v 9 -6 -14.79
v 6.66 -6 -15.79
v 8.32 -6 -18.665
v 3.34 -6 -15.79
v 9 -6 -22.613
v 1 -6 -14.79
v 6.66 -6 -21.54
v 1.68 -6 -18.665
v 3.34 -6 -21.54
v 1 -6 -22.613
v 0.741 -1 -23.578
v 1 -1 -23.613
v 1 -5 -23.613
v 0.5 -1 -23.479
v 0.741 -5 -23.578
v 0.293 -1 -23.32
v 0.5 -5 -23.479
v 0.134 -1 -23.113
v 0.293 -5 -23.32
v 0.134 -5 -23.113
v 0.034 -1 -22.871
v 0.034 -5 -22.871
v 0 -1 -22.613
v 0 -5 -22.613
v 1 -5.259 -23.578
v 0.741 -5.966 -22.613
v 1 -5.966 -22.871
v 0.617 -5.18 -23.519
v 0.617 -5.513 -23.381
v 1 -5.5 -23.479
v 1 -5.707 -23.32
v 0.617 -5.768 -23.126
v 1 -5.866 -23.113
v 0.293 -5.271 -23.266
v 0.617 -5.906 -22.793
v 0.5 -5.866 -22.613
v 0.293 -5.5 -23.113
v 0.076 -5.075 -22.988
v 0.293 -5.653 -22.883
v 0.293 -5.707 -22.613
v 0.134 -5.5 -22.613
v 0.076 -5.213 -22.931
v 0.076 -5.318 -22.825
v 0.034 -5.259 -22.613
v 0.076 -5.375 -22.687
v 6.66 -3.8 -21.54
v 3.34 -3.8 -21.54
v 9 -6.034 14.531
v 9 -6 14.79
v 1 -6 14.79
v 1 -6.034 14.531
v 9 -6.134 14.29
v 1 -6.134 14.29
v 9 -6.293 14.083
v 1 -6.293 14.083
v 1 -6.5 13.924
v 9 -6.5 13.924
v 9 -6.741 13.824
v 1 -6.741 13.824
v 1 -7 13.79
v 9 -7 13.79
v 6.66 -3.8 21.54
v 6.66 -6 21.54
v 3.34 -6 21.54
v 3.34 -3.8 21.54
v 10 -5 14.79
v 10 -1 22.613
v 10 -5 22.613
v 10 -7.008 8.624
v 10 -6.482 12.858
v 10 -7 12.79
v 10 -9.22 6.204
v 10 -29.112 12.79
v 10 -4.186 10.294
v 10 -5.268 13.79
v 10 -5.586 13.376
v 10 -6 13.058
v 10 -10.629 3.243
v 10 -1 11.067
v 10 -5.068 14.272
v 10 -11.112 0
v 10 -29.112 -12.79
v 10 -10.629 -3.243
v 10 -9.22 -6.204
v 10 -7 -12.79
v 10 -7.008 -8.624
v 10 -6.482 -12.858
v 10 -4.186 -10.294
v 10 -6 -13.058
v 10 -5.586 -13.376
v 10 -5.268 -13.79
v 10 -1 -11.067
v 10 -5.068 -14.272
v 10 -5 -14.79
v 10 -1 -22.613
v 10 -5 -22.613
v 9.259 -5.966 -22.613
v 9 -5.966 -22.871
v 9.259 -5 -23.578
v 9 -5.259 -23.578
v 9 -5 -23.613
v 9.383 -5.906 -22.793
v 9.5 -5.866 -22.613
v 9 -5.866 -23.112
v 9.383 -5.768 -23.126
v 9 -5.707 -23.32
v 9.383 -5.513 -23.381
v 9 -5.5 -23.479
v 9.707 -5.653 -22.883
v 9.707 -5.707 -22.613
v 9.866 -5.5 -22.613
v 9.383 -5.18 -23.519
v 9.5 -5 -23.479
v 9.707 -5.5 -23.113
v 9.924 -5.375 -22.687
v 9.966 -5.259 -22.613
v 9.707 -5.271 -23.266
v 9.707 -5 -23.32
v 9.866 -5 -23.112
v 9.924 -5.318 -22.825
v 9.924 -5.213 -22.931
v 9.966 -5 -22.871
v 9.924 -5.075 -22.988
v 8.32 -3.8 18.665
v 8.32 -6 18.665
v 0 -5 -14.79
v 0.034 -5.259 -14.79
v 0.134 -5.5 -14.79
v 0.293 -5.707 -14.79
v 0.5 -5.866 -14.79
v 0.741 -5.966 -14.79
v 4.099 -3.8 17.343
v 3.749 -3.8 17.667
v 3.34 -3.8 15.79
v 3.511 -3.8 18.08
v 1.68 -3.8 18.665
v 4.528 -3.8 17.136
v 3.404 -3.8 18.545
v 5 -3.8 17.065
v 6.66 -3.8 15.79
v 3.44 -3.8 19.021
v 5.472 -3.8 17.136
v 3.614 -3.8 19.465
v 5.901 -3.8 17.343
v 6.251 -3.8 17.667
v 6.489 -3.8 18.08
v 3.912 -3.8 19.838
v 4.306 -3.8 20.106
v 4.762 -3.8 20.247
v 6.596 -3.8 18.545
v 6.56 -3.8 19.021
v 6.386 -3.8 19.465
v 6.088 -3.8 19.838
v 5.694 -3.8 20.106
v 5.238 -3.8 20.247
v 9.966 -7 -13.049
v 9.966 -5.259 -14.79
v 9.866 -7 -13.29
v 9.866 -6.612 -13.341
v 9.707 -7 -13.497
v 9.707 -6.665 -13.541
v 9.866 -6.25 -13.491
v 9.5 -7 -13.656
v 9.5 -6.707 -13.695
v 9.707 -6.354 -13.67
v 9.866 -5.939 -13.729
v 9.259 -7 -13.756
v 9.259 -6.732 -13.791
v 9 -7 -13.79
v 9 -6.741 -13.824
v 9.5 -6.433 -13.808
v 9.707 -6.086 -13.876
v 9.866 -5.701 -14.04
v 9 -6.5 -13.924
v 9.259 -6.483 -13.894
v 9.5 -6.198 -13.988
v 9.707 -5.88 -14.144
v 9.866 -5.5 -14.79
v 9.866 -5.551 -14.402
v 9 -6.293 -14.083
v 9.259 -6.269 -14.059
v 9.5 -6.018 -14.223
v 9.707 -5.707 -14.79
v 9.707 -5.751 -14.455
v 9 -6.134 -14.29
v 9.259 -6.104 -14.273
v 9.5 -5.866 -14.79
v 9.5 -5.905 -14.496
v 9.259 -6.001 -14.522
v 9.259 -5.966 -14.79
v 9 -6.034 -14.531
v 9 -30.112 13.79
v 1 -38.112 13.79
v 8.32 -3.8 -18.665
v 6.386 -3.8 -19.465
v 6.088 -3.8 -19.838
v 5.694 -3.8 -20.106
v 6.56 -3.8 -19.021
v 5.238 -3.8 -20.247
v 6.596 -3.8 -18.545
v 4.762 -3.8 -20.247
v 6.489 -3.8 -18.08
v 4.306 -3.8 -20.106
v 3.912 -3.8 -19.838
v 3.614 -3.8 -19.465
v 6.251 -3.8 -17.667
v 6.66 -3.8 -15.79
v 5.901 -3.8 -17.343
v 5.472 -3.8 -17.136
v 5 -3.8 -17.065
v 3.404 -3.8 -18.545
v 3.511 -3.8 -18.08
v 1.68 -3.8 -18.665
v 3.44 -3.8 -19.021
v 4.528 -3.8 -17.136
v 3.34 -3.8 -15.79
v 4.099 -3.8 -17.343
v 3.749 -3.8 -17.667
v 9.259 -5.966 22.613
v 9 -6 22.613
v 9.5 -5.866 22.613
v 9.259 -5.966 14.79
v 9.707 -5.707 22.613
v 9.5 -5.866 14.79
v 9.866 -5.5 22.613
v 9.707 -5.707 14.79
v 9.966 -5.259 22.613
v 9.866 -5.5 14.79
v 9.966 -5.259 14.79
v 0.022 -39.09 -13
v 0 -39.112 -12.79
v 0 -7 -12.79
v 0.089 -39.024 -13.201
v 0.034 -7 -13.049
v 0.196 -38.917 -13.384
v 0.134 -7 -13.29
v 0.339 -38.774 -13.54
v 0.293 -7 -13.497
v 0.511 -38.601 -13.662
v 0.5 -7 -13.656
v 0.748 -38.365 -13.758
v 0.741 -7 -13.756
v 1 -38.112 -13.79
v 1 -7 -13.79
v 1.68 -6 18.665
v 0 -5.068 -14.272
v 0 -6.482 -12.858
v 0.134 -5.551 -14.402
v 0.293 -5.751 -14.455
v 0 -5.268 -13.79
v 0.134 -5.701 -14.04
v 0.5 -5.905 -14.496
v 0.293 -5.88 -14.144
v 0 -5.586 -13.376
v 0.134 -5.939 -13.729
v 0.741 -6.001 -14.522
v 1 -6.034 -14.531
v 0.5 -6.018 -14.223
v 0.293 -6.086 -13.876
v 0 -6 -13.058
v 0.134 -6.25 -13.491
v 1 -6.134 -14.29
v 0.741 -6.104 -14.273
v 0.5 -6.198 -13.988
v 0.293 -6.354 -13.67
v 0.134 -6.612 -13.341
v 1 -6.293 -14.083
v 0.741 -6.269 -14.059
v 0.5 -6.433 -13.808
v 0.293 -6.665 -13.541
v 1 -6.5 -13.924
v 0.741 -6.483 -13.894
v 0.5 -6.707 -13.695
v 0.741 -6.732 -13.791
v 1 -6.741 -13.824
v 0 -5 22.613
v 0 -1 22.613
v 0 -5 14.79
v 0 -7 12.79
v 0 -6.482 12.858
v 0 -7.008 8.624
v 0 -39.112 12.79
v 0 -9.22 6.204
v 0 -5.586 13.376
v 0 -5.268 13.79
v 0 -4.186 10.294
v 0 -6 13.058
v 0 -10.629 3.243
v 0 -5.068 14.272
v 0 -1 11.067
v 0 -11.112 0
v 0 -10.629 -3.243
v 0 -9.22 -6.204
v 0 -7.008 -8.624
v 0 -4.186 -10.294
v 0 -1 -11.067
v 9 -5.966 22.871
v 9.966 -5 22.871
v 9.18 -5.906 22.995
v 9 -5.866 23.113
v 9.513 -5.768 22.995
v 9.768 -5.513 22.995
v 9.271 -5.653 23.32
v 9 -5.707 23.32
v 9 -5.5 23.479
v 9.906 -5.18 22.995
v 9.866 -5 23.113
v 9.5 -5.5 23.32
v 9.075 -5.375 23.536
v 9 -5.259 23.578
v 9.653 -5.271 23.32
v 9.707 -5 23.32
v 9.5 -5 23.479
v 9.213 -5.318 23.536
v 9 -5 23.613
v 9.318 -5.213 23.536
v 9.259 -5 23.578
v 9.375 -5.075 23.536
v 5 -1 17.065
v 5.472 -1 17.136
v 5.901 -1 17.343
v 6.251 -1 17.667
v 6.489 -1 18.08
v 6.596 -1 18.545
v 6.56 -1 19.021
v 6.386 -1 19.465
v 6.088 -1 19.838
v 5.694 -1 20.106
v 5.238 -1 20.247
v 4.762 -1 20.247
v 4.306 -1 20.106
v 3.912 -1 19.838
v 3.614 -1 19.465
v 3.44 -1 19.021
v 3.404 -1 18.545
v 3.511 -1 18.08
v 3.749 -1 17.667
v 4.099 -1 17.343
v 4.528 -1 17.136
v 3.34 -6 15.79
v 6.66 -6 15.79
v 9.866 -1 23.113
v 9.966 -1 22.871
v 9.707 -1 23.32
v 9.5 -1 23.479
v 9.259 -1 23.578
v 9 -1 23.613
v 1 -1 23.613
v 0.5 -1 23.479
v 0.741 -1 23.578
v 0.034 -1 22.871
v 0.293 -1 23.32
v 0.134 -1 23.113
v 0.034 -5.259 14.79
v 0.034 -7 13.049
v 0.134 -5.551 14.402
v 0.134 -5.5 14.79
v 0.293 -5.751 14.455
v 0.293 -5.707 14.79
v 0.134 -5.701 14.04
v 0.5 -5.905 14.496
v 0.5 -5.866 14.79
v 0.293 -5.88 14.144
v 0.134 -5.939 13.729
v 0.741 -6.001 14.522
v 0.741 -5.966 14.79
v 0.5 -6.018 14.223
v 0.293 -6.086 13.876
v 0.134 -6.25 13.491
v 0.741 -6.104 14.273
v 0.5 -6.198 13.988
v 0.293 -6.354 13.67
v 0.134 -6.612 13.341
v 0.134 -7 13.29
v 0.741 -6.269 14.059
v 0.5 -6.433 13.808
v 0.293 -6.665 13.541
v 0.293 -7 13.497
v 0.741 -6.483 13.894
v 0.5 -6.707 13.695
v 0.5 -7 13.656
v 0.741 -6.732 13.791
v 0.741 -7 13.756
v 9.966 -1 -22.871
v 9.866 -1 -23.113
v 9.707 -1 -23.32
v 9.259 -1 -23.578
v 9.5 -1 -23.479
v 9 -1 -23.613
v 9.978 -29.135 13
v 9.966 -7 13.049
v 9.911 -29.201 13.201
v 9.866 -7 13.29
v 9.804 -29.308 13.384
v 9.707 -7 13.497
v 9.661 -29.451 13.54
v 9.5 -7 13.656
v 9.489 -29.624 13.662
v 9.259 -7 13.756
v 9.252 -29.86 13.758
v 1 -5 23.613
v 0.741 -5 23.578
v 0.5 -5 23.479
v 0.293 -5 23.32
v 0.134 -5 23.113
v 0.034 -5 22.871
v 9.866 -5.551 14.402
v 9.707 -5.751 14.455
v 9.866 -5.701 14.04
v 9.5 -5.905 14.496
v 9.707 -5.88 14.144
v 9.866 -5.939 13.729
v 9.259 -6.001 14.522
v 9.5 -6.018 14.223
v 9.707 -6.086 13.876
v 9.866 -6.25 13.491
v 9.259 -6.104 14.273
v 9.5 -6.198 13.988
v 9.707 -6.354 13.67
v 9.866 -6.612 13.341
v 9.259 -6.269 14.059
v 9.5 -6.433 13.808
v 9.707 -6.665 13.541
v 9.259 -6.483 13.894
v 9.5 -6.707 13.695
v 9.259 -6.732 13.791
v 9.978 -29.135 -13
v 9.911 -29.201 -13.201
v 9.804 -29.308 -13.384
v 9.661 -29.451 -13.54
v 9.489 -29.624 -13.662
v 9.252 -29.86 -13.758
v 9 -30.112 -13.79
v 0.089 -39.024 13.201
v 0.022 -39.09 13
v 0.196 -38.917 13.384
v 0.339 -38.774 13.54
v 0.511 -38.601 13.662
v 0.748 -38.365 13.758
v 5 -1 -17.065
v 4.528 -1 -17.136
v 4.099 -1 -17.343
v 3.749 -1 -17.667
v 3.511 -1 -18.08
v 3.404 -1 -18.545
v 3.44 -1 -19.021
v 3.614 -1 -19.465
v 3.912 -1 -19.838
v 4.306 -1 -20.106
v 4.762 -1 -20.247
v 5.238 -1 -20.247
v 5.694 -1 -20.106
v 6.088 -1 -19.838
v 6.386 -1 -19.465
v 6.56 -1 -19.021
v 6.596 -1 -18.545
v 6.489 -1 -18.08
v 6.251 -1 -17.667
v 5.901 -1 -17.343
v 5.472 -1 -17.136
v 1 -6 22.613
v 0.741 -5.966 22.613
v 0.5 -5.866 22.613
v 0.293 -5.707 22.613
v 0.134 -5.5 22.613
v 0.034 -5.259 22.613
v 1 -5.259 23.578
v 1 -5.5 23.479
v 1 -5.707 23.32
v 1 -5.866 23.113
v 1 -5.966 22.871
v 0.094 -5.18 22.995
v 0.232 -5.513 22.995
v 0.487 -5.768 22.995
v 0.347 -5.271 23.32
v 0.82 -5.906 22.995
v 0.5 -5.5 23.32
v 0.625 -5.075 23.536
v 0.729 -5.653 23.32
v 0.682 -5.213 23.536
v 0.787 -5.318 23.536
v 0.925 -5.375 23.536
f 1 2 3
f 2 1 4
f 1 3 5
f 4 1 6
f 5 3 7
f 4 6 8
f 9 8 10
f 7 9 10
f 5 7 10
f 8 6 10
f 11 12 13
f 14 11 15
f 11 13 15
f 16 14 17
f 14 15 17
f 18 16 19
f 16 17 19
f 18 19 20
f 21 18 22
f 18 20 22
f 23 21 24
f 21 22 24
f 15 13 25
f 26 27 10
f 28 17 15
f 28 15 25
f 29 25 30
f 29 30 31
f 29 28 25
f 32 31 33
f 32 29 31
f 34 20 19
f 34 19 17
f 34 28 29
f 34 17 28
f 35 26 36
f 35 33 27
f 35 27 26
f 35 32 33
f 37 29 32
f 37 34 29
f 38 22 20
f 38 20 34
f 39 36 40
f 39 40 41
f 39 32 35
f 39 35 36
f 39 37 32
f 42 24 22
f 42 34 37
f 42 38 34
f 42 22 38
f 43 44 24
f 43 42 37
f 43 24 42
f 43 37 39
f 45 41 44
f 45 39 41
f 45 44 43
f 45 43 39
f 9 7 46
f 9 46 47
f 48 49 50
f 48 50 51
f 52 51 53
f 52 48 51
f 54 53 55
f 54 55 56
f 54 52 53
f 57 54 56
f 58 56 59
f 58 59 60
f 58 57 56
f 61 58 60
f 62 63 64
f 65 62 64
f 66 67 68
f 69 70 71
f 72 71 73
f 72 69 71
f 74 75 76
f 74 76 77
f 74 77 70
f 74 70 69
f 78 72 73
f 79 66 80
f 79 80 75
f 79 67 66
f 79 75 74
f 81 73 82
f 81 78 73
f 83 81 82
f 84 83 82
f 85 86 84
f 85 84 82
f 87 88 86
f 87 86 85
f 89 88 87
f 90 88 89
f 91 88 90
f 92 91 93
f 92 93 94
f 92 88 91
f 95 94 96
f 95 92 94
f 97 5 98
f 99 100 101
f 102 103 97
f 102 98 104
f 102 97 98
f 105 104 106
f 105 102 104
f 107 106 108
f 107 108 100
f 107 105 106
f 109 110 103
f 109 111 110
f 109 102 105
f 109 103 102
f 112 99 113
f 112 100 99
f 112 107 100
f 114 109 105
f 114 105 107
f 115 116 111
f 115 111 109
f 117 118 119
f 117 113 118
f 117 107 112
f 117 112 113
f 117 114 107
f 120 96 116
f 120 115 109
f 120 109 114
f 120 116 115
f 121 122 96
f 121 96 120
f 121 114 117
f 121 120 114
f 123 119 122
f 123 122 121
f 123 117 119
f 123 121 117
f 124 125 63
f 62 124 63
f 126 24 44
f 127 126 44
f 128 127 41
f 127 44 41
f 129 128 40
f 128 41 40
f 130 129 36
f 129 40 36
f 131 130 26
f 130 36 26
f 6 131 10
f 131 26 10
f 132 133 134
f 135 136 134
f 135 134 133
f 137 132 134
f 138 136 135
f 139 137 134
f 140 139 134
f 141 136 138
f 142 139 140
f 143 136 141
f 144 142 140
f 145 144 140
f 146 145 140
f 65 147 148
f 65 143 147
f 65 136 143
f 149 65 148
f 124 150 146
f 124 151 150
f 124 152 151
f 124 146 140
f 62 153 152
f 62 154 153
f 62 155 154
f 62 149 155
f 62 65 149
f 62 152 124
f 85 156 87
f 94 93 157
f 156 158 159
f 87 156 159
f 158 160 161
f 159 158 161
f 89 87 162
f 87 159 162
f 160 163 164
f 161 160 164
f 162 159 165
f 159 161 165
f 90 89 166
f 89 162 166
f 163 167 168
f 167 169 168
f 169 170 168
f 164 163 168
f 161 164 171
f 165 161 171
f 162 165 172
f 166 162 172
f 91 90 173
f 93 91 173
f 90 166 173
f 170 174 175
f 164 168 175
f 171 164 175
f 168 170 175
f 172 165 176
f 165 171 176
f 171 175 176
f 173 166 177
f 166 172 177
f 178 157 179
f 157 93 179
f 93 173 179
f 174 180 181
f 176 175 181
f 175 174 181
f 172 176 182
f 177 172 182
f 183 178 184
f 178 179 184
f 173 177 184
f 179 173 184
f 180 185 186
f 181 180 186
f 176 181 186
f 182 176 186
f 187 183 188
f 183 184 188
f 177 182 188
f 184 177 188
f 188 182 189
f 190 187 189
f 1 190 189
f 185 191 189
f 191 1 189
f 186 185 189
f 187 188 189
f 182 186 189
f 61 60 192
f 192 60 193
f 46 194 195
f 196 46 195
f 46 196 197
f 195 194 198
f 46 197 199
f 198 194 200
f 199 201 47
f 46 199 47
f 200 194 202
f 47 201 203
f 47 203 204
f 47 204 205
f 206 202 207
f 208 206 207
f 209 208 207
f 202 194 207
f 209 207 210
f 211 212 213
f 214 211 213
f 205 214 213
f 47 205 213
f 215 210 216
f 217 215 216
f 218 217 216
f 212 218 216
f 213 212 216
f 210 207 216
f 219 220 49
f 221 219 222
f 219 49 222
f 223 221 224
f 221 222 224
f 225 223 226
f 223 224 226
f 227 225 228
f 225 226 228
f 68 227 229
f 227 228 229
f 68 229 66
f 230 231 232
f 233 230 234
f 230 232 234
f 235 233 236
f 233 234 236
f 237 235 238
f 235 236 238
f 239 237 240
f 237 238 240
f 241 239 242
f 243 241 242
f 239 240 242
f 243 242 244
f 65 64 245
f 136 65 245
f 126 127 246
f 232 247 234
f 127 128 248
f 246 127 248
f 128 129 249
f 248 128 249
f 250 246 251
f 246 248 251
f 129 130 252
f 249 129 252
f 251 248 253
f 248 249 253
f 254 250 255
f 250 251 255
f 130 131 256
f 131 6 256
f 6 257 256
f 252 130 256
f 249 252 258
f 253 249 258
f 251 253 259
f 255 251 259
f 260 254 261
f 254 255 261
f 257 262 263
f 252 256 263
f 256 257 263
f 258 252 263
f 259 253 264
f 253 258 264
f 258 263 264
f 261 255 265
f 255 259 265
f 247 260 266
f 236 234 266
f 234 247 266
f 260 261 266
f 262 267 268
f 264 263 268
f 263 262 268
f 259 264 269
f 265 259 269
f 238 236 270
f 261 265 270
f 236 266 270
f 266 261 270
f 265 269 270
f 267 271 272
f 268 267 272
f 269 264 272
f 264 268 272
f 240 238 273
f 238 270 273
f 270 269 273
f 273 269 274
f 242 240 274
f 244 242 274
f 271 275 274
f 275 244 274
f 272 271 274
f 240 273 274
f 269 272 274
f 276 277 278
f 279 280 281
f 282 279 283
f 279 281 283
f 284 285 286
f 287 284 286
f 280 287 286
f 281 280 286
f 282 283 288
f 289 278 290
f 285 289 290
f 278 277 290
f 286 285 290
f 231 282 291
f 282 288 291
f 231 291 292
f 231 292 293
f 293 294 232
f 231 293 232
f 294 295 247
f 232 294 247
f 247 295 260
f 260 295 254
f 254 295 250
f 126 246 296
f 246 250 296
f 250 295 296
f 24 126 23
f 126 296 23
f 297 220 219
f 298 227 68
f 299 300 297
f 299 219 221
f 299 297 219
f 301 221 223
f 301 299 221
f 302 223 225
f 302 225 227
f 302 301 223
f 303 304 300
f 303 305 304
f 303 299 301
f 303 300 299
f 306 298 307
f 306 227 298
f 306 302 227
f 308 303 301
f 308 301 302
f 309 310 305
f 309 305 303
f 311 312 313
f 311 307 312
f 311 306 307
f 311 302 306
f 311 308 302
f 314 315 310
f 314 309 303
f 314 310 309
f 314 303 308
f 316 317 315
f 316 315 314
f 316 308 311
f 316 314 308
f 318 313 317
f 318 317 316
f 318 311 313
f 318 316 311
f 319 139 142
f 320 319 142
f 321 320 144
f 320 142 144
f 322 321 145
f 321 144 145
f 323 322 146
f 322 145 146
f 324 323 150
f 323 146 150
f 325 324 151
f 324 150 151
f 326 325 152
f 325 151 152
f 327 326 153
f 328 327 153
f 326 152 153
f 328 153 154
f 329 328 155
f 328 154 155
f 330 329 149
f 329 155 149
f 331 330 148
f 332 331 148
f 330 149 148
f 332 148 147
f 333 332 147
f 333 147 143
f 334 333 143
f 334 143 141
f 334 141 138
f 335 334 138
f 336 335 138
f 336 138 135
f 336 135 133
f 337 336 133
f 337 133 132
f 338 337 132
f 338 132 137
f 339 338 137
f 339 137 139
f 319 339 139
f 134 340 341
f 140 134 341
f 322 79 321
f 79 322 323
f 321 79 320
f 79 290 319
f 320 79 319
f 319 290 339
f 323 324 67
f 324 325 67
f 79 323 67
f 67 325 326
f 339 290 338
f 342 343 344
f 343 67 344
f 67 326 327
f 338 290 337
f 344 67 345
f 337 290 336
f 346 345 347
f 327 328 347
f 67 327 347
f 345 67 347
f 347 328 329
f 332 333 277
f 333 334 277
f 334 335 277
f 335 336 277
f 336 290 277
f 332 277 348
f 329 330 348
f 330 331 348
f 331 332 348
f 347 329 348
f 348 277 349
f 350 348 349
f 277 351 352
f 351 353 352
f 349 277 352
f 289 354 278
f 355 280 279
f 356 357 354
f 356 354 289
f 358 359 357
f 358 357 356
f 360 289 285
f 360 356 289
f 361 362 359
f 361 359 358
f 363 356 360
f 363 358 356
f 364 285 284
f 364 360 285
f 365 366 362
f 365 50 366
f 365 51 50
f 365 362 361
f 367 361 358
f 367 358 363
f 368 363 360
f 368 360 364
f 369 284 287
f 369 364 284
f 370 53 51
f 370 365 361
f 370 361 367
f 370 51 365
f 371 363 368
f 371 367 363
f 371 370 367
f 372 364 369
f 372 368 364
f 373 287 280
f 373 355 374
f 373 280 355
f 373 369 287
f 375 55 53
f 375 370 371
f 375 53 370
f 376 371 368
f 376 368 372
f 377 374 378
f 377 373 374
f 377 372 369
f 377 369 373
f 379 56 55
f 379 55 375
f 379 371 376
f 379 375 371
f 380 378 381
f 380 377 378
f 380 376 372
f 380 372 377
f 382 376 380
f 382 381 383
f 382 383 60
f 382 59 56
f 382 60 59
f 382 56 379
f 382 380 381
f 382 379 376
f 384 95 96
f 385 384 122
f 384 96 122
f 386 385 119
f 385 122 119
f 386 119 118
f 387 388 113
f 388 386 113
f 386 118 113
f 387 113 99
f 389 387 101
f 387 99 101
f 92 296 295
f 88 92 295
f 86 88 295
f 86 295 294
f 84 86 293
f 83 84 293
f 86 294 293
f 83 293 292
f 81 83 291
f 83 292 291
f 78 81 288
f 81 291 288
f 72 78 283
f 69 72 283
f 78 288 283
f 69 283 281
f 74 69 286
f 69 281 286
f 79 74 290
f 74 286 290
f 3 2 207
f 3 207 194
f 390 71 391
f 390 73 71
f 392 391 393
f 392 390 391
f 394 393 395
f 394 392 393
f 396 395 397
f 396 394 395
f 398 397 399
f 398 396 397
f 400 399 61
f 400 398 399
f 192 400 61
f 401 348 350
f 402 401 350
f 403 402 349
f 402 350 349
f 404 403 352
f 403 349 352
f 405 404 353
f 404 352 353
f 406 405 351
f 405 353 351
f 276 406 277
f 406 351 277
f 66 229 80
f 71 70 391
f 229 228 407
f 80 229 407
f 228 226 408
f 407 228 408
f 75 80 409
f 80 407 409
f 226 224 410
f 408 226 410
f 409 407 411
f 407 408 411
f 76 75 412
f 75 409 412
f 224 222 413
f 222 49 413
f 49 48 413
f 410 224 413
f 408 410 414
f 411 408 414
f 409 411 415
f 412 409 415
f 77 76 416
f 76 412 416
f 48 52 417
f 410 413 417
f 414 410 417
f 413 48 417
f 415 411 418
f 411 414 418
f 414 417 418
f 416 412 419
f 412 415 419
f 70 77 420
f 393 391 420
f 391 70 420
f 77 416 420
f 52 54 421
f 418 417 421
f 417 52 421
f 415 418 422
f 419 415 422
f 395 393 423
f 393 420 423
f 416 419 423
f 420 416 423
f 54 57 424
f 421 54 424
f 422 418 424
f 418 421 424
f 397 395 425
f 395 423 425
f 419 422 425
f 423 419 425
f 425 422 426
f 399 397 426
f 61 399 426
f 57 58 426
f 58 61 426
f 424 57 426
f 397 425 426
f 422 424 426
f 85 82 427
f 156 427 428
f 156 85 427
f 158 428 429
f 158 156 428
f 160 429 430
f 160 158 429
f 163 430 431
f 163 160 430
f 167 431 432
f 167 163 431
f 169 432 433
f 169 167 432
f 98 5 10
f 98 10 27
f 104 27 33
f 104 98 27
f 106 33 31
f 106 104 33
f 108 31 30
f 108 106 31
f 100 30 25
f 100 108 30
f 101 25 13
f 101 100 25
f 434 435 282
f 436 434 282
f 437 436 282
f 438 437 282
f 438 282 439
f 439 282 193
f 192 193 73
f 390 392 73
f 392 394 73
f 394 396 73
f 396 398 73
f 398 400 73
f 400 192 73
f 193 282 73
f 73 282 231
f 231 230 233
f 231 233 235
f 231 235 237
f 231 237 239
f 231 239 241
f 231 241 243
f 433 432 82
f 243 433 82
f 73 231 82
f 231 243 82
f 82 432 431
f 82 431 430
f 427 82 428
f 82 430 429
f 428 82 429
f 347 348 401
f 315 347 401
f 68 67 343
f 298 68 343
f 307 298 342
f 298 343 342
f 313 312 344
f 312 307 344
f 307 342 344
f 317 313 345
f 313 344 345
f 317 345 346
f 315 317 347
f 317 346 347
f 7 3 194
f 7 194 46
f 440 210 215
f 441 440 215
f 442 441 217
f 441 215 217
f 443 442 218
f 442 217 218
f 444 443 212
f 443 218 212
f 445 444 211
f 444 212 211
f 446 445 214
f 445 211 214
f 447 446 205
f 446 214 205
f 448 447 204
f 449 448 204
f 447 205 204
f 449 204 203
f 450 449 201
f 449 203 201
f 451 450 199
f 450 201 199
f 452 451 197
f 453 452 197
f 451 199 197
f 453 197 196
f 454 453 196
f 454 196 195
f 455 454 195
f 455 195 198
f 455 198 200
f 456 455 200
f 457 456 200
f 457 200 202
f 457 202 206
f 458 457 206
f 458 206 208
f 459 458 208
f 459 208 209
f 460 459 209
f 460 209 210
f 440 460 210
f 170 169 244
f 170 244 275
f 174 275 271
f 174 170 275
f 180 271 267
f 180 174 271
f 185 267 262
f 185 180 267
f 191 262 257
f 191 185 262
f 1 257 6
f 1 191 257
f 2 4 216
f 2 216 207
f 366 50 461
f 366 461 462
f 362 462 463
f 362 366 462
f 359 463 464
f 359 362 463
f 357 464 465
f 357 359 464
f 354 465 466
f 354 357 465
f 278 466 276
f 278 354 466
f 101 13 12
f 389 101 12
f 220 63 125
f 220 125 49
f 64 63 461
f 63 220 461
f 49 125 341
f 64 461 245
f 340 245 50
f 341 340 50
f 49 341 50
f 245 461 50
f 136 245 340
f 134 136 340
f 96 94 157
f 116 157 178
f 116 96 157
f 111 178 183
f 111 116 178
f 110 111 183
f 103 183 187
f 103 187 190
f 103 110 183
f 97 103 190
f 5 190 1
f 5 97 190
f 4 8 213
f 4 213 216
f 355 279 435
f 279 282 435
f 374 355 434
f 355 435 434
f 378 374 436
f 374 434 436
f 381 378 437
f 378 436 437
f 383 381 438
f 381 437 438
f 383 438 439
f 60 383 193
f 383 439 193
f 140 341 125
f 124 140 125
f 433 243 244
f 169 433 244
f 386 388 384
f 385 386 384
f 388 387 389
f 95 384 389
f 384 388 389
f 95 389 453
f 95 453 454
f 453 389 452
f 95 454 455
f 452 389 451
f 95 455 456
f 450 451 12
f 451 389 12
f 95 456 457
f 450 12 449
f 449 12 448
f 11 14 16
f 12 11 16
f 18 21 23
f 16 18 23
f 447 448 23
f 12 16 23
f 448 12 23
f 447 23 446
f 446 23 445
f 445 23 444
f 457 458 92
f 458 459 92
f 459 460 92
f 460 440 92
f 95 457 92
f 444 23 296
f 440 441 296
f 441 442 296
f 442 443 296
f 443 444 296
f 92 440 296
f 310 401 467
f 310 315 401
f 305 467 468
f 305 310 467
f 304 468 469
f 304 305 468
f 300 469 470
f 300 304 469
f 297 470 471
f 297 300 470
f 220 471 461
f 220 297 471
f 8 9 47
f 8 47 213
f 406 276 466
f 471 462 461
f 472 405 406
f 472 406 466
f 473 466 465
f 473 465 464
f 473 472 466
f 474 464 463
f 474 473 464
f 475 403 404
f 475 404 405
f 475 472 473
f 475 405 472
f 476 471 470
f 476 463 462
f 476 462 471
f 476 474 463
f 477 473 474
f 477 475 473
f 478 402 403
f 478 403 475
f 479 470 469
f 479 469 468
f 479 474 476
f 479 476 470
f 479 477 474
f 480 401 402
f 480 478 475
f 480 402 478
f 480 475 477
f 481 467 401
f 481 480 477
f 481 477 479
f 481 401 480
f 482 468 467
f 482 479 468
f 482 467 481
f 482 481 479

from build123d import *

# Parameters (mm, degrees)
CLAMP_EXTRUDE_DEPTH = 10
CUT_EXTRUDE3_DEPTH  = 56.03390543
FILLET2_R           = 1
FILLET3_R           = 1
CUT_EXTRUDE4_DEPTH  = 2.2
HOLE_5_R            = 1.6
CUT_EXTRUDE5_DEPTH  = 42.880637682


with BuildPart() as part:
    # Sketch4 → Clamp Extrude (new body)
    with BuildSketch(Plane(origin=(0, 0, 0), x_dir=(0, 0, -1), z_dir=(1, 0, 0))):
        with BuildLine():
            Line((-23.612500003, -1), (-23.612500003, -6))
            Line((-23.612500003, -6), (-13.789947652, -6))
            Line((-13.789947652, -6), (-13.789947652, -39.1125))
            Line((-13.789947652, -39.1125), (13.789947652, -39.1125))
            Line((13.789947652, -39.1125), (13.789947652, -6))
            Line((13.789947652, -6), (23.612500003, -6))
            Line((23.612500003, -6), (23.612500003, -1))
            Line((23.612500003, -1), (11.067414163, -1))
            ThreePointArc((11.067414163, -1), (0, -11.1125), (-11.067414163, -1))
            Line((-11.067414163, -1), (-23.612500003, -1))
        make_face()
    extrude(amount=CLAMP_EXTRUDE_DEPTH)

    # Sketch10 → Cut-Extrude3 (cut, through all)
    with BuildSketch(Plane(origin=(0, 0, -13.789947652), x_dir=(-1, 0, 0), z_dir=(0, 0, -1))):
        Polygon((0, -39.1125), (-10, -29.1125), (-10, -39.1125), align=None)
    extrude(amount=-CUT_EXTRUDE3_DEPTH, mode=Mode.SUBTRACT)

    # Fillet2
    fillet2_edges = [part.edges().sort_by_distance(p)[0] for p in [
        (0, -6, 18.701223827),
        (0, -6, -18.701223827),
        (0, -22.55625, -13.789947652),
        (0, -22.55625, 13.789947652),
        (10, -6, -18.701223827),
        (5, -6, 13.789947652),
        (5, -6, 23.612500003),
        (5, -6, -23.612500003),
        (5, -6, -13.789947652),
        (10, -17.55625, -13.789947652),
        (10, -6, 18.701223827),
        (10, -17.55625, 13.789947652),
    ]]
    fillet(fillet2_edges, radius=FILLET2_R)

    # Fillet3
    # the kernel refuses this fillet: 1 mm, written as the material it takes off along each edge
    with BuildSketch(Plane(origin=(1, -5, 22.612500003), x_dir=(-1, 0, 0), z_dir=(0, 0, 1))) as fillet3_piece_1_section:
        Polygon((0, 0), (FILLET3_R, 0), (FILLET3_R, FILLET3_R), (0, FILLET3_R), align=None)
    fillet3_piece_1 = extrude(amount=FILLET3_R, mode=Mode.PRIVATE)
    fillet3_piece_1 = fillet3_piece_1 - Plane(origin=(1, -5, 22.612500003), x_dir=(0.7071067811865475, 0.7071067811865475, 0), z_dir=(0, 0, 1)) * Sphere(FILLET3_R, mode=Mode.PRIVATE)
    add(fillet3_piece_1, mode=Mode.SUBTRACT)
    with BuildSketch(Plane(origin=(9, -5, 22.612500003), x_dir=(1, 0, 0), z_dir=(0, 0, 1))) as fillet3_piece_2_section:
        Polygon((0, 0), (FILLET3_R, 0), (FILLET3_R, -FILLET3_R), (0, -FILLET3_R), align=None)
    fillet3_piece_2 = extrude(amount=FILLET3_R, mode=Mode.PRIVATE)
    fillet3_piece_2 = fillet3_piece_2 - Plane(origin=(9, -5, 22.612500003), x_dir=(-0.7071067811865475, 0.7071067811865475, 0), z_dir=(0, 0, 1)) * Sphere(FILLET3_R, mode=Mode.PRIVATE)
    add(fillet3_piece_2, mode=Mode.SUBTRACT)
    with BuildSketch(Plane(origin=(9, -5, -22.612500003), x_dir=(0, 0, -1), z_dir=(1, 0, 0))) as fillet3_piece_3_section:
        Polygon((0, 0), (FILLET3_R, 0), (FILLET3_R, -FILLET3_R), (0, -FILLET3_R), align=None)
    fillet3_piece_3 = extrude(amount=FILLET3_R, mode=Mode.PRIVATE)
    fillet3_piece_3 = fillet3_piece_3 - Plane(origin=(9, -5, -22.612500003), x_dir=(0, 0.7071067811865475, 0.7071067811865475), z_dir=(1, 0, 0)) * Sphere(FILLET3_R, mode=Mode.PRIVATE)
    add(fillet3_piece_3, mode=Mode.SUBTRACT)
    with BuildSketch(Plane(origin=(1, -5, -22.612500003), x_dir=(0, 0, -1), z_dir=(-1, 0, 0))) as fillet3_piece_4_section:
        Polygon((0, 0), (FILLET3_R, 0), (FILLET3_R, FILLET3_R), (0, FILLET3_R), align=None)
    fillet3_piece_4 = extrude(amount=FILLET3_R, mode=Mode.PRIVATE)
    fillet3_piece_4 = fillet3_piece_4 - Plane(origin=(1, -5, -22.612500003), x_dir=(0, 0.7071067811865475, 0.7071067811865475), z_dir=(-1, 0, 0)) * Sphere(FILLET3_R, mode=Mode.PRIVATE)
    add(fillet3_piece_4, mode=Mode.SUBTRACT)
    with BuildSketch(Plane(origin=(0, 1.5, 23.612500003), x_dir=(1, 0, 0), z_dir=(0, -1, 0)), Plane(origin=(10, -5, -23.612500003), x_dir=(0, 0, 1), z_dir=(0, 1, 0))) as fillet3_piece_5:
        with BuildLine():
            CenterArc((FILLET3_R, -FILLET3_R), FILLET3_R, 90, 90)
            Line((0, -FILLET3_R), (0, 0))
            Line((0, 0), (FILLET3_R, 0))
        make_face()
    extrude(amount=6.5, mode=Mode.SUBTRACT)
    with BuildSketch(Plane(origin=(10, 1.5, 23.612500003), x_dir=(-1, 0, 0), z_dir=(0, -1, 0)), Plane(origin=(0, -5, -23.612500003), x_dir=(0, 0, 1), z_dir=(0, 1, 0))) as fillet3_piece_6:
        with BuildLine():
            CenterArc((FILLET3_R, FILLET3_R), FILLET3_R, 180, 90)
            Line((0, FILLET3_R), (0, 0))
            Line((0, 0), (FILLET3_R, 0))
        make_face()
    extrude(amount=6.5, mode=Mode.SUBTRACT)

    # Hole → Cut-Extrude4 (cut)
    with BuildSketch(Plane.XZ.offset(6)):
        Polygon((8.319764048, 18.664947652), (6.659882024, 21.539947652), (3.340117976, 21.539947652), (1.680235952, 18.664947652), (3.340117976, 15.789947652), (6.659882024, 15.789947652), align=None)
        Polygon((6.659882024, -15.789947652), (8.319764048, -18.664947652), (6.659882024, -21.539947652), (3.340117976, -21.539947652), (1.680235952, -18.664947652), (3.340117976, -15.789947652), align=None)
    extrude(amount=-CUT_EXTRUDE4_DEPTH, mode=Mode.SUBTRACT)

    # Hole<5> → Cut-Extrude5 (cut, through all)
    with BuildSketch(Plane.XZ.offset(6)):
        with Locations(Location((5, 18.664947652, 0), (0, 0, 270))):
            Circle(HOLE_5_R)
        with Locations(Location((5, -18.664947652, 0), (0, 0, 90))):
            Circle(HOLE_5_R)
    extrude(amount=-CUT_EXTRUDE5_DEPTH, mode=Mode.SUBTRACT)


solid = part.part
